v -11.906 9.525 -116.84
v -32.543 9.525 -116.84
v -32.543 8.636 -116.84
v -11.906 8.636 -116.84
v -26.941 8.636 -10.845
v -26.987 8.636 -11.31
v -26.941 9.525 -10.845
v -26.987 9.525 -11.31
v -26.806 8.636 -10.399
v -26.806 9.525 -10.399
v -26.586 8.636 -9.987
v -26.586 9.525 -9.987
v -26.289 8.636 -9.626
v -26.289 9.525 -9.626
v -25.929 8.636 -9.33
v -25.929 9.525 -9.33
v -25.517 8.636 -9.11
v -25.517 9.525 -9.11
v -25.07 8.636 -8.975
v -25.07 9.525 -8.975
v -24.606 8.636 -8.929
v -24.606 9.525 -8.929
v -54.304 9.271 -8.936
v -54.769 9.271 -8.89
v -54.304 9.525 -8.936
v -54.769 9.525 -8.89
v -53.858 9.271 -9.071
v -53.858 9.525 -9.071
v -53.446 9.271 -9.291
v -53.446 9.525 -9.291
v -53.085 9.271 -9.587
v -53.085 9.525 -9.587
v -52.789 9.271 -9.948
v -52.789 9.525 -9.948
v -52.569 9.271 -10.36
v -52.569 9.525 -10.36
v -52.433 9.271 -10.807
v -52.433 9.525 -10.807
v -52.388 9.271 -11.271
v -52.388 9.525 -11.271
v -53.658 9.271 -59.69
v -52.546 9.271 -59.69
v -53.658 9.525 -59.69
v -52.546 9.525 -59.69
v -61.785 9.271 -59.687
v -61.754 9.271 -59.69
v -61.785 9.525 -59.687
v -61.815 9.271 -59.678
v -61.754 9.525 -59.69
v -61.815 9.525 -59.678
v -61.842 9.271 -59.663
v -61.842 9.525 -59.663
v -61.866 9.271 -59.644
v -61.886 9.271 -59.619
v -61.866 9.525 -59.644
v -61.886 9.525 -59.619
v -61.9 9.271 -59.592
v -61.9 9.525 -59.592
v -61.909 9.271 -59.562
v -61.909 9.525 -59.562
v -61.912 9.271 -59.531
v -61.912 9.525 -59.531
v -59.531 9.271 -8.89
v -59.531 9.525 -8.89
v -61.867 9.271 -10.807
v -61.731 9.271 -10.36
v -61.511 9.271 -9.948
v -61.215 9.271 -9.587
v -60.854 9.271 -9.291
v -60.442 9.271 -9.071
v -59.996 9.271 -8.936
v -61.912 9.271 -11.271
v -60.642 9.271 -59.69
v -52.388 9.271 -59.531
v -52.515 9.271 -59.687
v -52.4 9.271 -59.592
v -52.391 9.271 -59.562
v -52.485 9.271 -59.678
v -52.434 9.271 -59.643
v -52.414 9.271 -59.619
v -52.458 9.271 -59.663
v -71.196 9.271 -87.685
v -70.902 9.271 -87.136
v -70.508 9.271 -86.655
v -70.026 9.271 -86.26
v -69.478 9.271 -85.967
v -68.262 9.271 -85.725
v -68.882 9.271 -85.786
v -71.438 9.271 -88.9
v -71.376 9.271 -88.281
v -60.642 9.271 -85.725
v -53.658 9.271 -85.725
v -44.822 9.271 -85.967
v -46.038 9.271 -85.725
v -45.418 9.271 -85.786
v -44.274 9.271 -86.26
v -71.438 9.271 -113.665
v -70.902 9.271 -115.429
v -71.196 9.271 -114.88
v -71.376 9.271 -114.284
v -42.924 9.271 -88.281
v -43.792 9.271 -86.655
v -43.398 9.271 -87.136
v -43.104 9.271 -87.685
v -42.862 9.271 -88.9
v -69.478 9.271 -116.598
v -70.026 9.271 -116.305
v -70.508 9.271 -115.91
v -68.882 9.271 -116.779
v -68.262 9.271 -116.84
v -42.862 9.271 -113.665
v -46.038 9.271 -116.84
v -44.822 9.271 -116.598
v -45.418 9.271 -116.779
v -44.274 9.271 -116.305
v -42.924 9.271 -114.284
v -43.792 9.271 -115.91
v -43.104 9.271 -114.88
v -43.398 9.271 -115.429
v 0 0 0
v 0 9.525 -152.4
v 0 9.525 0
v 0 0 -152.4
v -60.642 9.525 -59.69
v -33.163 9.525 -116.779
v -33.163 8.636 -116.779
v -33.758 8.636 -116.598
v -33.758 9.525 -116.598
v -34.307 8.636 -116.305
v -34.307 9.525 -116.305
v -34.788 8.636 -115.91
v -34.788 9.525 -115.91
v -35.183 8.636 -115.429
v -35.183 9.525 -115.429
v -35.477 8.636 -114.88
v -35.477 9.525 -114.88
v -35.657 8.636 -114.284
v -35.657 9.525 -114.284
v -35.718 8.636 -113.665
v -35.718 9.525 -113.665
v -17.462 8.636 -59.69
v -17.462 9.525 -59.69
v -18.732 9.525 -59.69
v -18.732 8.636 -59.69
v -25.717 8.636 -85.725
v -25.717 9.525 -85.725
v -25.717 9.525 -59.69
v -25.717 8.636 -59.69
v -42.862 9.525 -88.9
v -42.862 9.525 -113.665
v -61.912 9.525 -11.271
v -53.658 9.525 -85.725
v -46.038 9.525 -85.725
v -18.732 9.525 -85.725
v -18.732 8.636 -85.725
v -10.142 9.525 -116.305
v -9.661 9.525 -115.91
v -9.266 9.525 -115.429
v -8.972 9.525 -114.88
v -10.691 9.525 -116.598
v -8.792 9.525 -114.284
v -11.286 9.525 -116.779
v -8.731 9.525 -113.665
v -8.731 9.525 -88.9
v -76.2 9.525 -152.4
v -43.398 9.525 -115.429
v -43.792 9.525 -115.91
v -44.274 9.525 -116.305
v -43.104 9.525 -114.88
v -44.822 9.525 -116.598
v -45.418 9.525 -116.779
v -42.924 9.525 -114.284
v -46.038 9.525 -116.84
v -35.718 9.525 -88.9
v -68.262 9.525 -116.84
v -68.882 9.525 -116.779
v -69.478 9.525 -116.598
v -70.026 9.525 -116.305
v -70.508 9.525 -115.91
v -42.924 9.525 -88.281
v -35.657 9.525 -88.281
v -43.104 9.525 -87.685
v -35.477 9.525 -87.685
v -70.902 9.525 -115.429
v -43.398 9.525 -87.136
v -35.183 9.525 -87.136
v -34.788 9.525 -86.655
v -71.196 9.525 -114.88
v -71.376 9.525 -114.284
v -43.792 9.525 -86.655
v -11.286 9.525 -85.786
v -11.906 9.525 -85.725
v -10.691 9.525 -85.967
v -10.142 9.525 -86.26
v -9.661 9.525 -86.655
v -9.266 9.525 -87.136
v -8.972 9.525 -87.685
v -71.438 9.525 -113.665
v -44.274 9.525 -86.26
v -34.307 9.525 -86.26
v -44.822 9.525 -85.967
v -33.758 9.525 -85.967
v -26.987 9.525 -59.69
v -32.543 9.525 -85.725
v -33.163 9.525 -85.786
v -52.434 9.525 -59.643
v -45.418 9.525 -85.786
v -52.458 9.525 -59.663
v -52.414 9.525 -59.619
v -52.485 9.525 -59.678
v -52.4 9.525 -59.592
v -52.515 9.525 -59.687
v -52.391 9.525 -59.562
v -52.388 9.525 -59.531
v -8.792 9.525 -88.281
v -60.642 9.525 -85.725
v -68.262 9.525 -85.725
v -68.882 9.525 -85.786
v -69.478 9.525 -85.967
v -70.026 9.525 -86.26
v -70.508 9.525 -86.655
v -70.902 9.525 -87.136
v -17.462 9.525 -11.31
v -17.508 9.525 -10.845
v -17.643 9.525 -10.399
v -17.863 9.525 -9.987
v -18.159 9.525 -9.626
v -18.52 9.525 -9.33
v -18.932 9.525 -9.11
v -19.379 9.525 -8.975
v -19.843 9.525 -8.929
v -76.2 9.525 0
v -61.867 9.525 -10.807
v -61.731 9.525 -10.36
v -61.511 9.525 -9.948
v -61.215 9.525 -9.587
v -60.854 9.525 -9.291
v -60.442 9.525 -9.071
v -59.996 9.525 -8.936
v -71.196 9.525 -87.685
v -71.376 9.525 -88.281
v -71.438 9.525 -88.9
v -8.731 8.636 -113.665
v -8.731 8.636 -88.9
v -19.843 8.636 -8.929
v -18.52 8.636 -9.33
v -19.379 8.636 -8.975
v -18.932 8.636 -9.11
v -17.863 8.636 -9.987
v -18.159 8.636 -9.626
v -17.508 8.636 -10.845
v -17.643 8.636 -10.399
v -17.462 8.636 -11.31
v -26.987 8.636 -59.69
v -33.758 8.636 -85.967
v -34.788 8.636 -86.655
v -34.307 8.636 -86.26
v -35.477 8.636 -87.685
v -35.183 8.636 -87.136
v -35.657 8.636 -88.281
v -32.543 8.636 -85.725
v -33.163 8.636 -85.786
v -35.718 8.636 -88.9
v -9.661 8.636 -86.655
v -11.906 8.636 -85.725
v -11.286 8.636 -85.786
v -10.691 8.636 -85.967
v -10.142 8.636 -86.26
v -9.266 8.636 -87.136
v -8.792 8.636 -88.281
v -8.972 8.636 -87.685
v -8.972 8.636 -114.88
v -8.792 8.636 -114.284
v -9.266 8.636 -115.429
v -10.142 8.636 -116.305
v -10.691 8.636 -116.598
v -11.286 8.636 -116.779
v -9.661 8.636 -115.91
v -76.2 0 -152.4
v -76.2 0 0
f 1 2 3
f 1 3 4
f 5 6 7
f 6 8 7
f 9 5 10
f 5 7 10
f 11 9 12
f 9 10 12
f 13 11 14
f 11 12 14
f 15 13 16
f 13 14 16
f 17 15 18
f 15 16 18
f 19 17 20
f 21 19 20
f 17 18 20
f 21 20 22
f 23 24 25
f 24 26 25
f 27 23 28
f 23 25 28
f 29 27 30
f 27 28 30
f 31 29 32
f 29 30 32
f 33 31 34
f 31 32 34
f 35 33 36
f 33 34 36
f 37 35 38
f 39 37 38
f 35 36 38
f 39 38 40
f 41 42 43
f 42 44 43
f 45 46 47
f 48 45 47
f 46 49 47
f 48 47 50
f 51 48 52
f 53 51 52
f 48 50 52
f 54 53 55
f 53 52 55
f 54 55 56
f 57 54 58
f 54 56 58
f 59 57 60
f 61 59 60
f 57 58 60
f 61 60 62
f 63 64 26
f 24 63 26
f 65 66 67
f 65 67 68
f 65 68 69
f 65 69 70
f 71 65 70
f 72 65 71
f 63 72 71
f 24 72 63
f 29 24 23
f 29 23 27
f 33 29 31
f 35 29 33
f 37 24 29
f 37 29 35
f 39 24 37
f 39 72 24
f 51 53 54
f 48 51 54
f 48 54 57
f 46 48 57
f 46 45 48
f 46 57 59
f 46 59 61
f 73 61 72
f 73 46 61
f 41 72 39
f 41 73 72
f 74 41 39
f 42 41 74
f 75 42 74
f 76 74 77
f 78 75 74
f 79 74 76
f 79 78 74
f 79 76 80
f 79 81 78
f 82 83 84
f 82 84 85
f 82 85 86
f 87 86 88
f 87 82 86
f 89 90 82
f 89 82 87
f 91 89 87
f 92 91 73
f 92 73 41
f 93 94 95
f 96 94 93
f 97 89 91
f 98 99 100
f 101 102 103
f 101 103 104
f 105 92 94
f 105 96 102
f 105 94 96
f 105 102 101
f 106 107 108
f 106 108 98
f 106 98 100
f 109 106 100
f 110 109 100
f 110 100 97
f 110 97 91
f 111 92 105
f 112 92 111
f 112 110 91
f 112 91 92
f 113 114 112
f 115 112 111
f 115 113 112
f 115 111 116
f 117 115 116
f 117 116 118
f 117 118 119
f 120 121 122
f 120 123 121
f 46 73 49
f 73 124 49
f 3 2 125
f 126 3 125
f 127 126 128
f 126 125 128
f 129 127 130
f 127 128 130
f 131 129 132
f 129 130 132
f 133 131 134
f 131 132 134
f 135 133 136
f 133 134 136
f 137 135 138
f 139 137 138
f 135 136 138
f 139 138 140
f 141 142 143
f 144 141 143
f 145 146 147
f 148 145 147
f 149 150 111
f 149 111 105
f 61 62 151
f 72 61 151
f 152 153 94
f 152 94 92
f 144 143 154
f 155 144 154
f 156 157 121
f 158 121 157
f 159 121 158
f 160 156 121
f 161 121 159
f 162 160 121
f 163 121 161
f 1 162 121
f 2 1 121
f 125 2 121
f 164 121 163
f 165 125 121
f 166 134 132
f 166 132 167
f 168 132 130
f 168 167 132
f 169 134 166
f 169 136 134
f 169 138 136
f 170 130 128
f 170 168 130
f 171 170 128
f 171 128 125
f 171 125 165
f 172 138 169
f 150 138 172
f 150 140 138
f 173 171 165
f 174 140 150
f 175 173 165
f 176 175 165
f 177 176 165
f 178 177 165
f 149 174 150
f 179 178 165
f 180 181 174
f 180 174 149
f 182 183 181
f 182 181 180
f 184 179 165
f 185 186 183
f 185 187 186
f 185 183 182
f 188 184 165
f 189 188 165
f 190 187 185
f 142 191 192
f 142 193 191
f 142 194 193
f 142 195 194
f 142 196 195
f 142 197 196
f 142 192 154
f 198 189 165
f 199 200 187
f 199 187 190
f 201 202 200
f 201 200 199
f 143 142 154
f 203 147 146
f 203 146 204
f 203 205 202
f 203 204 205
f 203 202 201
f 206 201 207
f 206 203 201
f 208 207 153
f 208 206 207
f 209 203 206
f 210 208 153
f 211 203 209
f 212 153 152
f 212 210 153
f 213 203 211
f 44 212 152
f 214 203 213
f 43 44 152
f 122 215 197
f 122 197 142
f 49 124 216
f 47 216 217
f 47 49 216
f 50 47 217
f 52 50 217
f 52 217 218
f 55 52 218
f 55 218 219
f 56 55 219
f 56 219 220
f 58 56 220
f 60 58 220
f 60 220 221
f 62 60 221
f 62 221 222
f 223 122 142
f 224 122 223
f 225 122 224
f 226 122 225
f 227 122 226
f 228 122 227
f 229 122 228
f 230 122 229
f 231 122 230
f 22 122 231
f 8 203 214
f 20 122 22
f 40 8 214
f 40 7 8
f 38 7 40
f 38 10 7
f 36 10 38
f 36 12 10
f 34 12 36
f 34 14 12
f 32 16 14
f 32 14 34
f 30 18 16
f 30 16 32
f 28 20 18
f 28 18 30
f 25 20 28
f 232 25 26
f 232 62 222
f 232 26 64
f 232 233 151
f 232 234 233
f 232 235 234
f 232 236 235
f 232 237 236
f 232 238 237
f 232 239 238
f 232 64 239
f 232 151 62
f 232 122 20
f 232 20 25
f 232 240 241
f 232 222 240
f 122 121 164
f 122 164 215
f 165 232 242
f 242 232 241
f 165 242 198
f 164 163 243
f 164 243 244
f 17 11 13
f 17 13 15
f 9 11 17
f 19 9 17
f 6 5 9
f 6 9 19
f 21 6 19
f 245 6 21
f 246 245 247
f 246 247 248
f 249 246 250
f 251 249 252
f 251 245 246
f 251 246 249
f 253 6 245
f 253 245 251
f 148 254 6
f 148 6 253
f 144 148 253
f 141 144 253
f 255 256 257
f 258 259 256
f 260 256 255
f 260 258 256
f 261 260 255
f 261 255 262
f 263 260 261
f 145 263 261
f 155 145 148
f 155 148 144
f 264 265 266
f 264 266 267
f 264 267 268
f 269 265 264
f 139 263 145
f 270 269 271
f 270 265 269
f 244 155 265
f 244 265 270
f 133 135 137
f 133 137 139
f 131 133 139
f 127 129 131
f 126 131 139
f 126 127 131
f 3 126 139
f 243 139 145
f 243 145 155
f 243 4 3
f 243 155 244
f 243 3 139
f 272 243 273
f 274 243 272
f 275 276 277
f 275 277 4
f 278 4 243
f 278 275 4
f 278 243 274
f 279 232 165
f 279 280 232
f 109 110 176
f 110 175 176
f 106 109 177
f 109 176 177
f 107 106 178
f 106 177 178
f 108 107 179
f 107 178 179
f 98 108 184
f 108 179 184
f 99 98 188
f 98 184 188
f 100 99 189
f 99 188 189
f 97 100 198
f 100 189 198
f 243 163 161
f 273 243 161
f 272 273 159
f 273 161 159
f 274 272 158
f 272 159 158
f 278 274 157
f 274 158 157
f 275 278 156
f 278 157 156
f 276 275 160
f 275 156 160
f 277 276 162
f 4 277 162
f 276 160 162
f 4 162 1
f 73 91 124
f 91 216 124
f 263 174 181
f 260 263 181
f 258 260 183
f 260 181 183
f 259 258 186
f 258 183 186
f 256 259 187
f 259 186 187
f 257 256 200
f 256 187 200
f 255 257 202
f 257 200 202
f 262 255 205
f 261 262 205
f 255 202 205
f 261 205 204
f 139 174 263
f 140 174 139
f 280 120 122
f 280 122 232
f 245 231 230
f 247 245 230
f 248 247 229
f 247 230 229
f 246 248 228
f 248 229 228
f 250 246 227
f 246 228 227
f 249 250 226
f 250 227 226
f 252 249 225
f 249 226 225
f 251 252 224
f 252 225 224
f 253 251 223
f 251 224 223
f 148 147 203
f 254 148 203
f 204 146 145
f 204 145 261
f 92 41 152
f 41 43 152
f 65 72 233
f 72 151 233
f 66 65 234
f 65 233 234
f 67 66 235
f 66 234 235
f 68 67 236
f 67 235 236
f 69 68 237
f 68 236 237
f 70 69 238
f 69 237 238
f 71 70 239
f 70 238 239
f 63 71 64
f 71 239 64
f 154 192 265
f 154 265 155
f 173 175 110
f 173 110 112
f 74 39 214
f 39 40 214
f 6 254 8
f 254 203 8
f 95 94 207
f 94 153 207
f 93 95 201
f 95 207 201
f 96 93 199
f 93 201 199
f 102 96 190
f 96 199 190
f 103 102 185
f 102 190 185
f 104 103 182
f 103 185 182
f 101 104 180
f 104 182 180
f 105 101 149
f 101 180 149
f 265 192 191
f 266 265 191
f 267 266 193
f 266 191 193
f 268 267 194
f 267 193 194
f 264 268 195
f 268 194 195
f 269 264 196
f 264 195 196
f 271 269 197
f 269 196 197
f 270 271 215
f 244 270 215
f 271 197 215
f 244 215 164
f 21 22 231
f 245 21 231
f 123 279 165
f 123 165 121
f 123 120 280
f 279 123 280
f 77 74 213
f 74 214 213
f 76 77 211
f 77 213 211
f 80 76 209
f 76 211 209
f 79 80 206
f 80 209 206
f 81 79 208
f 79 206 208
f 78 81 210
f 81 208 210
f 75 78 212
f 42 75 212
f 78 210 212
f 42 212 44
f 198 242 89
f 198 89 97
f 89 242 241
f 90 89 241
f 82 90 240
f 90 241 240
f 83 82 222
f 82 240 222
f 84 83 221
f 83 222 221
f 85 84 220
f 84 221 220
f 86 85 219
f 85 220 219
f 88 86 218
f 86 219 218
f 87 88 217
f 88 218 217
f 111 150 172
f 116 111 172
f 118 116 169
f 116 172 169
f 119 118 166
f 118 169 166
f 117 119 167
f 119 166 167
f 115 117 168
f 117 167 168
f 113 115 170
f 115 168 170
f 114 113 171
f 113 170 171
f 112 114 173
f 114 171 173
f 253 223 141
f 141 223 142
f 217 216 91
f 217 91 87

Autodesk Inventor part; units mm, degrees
ref_plane "YZ Plane" through (0, 0, 0) normal (1, 0, 0) x (0, 1, 0)
ref_plane "XZ Plane" through (0, 0, 0) normal (0, 1, 0) x (-1, 0, 0)
ref_plane "XY Plane" through (0, 0, 0) normal (0, 0, 1) x (1, 0, 0)
sketch "Sketch1" plane through (0, 0, 0) normal (0, 1, 0) x (-1, 0, 0)
  line L0 (0, 0) -> (76.2, 0)
  line L1 (76.2, 0) -> (76.2, -152.4)
  line L2 (76.2, -152.4) -> (0, -152.4)
  line L3 (0, -152.4) -> (0, 0)
  dimension "d0" = 76.2
  dimension "d1" = 152.4
extrude "Extrusion1" add sketch "Sketch1" along normal blind 9.525
sketch "Sketch2" plane through (0, 9.525, 0) normal (0, 1, 0) x (1, 0, 0)
  line L0 (-59.5312, 8.89) -> (-54.7688, 8.89)
  line L1 (-52.3875, 11.2712) -> (-52.3875, 59.5312)
  line L2 (-61.9125, 59.5312) -> (-61.9125, 11.2712)
  line L3 (-76.2, 152.4) -> (-76.2, 0) projected
  line L4 (-76.2, 0) -> (0, 0) projected
  arc A0 (-61.9125, 9.0487) -> (-61.7538, 8.89) centre (-61.7538, 9.0487) ccw
  arc A1 (-52.5462, 8.89) -> (-52.3875, 9.0487) centre (-52.5462, 9.0487) ccw
  arc A2 (-52.3875, 59.5312) -> (-52.5462, 59.69) centre (-52.5462, 59.5312) ccw
  arc A3 (-61.7538, 59.69) -> (-61.9125, 59.5312) centre (-61.7538, 59.5312) ccw
  line L5 (-60.6425, 59.69) -> (-53.6575, 59.69)
  line L6 (-53.6575, 59.69) -> (-53.6575, 116.84)
  line L7 (-60.6425, 116.84) -> (-60.6425, 59.69)
  line L8 (-52.5462, 59.69) -> (-53.6575, 59.69)
  line L9 (-60.6425, 59.69) -> (-61.7538, 59.69)
  line L10 (-68.2625, 116.84) -> (-46.0375, 116.84)
  line L11 (-42.8625, 113.665) -> (-42.8625, 88.9)
  line L12 (-46.0375, 85.725) -> (-68.2625, 85.725)
  line L13 (-71.4375, 88.9) -> (-71.4375, 113.665)
  arc A4 (-71.4375, 88.9) -> (-68.2625, 85.725) centre (-68.2625, 88.9) ccw
  arc A5 (-68.2625, 116.84) -> (-71.4375, 113.665) centre (-68.2625, 113.665) ccw
  arc A6 (-42.8625, 113.665) -> (-46.0375, 116.84) centre (-46.0375, 113.665) ccw
  arc A7 (-46.0375, 85.725) -> (-42.8625, 88.9) centre (-46.0375, 88.9) ccw
  arc A8 (-54.7688, 8.89) -> (-52.3875, 11.2712) centre (-54.7688, 11.2712) ccw
  arc A9 (-61.9125, 11.2712) -> (-59.5312, 8.89) centre (-59.5312, 11.2712) ccw
  point P0 (-61.9125, 8.89)
  point P1 (-52.3875, 69.85)
  point P2 (-52.3875, 8.89)
  point P3 (-61.9125, 69.85)
  point P4 (-57.15, 69.85)
  point P5 (-57.15, 132.715)
  point P6 (-71.4375, 116.84)
  point P7 (-42.8625, 85.725)
  point P8 (-42.8625, 116.84)
  point P9 (-71.4375, 85.725)
  point P10 (-57.15, 116.84)
  point P11 (-57.15, 8.89)
  point P12 (-57.15, 59.69)
  point P13 (-60.6425, 85.725)
  point P14 (-53.6575, 85.725)
  dimension "d22" = 0
  dimension "d28" = 0
  dimension "d36" = 26.035
  dimension "d37" = 50.8
  dimension "d41" = 9.525
  dimension "d47" = 2.3813
extrude "Extrusion2" cut sketch "Sketch2" against normal blind 0.254
sketch "Sketch3" plane through (0, 9.525, 0) normal (0, 1, 0) x (1, 0, 0)
  line L0 (-24.6057, 8.9288) -> (-19.8432, 8.9288)
  line L1 (-17.4619, 11.31) -> (-17.4619, 57.3087)
  line L2 (-26.9869, 57.3087) -> (-26.9869, 11.31)
  arc A0 (-26.9869, 11.31) -> (-24.6057, 8.9288) centre (-24.6057, 11.31) ccw
  arc A1 (-19.8432, 8.9288) -> (-17.4619, 11.31) centre (-19.8432, 11.31) ccw
  line L3 (-18.7319, 59.69) -> (-18.7319, 116.84)
  line L4 (-25.7169, 116.84) -> (-25.7169, 59.69)
  line L5 (0, 152.4) -> (-76.2, 152.4) projected
  line L6 (-32.5432, 116.84) -> (-11.9057, 116.84)
  line L7 (-8.7307, 113.665) -> (-8.7307, 88.9)
  line L8 (-11.9057, 85.725) -> (-32.5432, 85.725)
  line L9 (-35.7182, 88.9) -> (-35.7182, 113.665)
  line L10 (-46.0375, 85.725) -> (-53.6575, 85.725) projected
  arc A2 (-32.5432, 116.84) -> (-35.7182, 113.665) centre (-32.5432, 113.665) ccw
  arc A3 (-35.7182, 88.9) -> (-32.5432, 85.725) centre (-32.5432, 88.9) ccw
  arc A4 (-11.9057, 85.725) -> (-8.7307, 88.9) centre (-11.9057, 88.9) ccw
  arc A5 (-8.7307, 113.665) -> (-11.9057, 116.84) centre (-11.9057, 113.665) ccw
  line L11 (-17.4619, 57.3087) -> (-17.4619, 59.69)
  line L12 (-17.4619, 59.69) -> (-18.7319, 59.69)
  line L13 (-25.7169, 59.69) -> (-26.9869, 59.69)
  line L14 (-26.9869, 59.69) -> (-26.9869, 57.3087)
  point P0 (0, 0)
  point P1 (-26.9869, 8.9288)
  point P2 (-21.4307, 55.0791)
  point P3 (-22.2244, 132.715)
  point P4 (-8.7307, 85.725)
  point P5 (-35.7182, 85.725)
  point P6 (-22.2244, 116.84)
  point P7 (-49.8475, 85.725)
  point P8 (-25.7169, 85.725)
  point P9 (-18.7319, 116.84)
  point P10 (-18.7319, 85.725)
  point P11 (-25.1613, 59.69)
  point P12 (-22.2244, 8.9288)
  dimension "d12" = 9.525
  dimension "d13" = 2.3813
  dimension "d33" = 0
  dimension "d34" = 3.175
  dimension "d40" = 26.035
  dimension "d42" = 0
  dimension "d43" = 0
  dimension "d45" = 6.985
extrude "Extrusion3" cut sketch "Sketch3" against normal blind 0.889
properties part number "0p03_total_thickness"
